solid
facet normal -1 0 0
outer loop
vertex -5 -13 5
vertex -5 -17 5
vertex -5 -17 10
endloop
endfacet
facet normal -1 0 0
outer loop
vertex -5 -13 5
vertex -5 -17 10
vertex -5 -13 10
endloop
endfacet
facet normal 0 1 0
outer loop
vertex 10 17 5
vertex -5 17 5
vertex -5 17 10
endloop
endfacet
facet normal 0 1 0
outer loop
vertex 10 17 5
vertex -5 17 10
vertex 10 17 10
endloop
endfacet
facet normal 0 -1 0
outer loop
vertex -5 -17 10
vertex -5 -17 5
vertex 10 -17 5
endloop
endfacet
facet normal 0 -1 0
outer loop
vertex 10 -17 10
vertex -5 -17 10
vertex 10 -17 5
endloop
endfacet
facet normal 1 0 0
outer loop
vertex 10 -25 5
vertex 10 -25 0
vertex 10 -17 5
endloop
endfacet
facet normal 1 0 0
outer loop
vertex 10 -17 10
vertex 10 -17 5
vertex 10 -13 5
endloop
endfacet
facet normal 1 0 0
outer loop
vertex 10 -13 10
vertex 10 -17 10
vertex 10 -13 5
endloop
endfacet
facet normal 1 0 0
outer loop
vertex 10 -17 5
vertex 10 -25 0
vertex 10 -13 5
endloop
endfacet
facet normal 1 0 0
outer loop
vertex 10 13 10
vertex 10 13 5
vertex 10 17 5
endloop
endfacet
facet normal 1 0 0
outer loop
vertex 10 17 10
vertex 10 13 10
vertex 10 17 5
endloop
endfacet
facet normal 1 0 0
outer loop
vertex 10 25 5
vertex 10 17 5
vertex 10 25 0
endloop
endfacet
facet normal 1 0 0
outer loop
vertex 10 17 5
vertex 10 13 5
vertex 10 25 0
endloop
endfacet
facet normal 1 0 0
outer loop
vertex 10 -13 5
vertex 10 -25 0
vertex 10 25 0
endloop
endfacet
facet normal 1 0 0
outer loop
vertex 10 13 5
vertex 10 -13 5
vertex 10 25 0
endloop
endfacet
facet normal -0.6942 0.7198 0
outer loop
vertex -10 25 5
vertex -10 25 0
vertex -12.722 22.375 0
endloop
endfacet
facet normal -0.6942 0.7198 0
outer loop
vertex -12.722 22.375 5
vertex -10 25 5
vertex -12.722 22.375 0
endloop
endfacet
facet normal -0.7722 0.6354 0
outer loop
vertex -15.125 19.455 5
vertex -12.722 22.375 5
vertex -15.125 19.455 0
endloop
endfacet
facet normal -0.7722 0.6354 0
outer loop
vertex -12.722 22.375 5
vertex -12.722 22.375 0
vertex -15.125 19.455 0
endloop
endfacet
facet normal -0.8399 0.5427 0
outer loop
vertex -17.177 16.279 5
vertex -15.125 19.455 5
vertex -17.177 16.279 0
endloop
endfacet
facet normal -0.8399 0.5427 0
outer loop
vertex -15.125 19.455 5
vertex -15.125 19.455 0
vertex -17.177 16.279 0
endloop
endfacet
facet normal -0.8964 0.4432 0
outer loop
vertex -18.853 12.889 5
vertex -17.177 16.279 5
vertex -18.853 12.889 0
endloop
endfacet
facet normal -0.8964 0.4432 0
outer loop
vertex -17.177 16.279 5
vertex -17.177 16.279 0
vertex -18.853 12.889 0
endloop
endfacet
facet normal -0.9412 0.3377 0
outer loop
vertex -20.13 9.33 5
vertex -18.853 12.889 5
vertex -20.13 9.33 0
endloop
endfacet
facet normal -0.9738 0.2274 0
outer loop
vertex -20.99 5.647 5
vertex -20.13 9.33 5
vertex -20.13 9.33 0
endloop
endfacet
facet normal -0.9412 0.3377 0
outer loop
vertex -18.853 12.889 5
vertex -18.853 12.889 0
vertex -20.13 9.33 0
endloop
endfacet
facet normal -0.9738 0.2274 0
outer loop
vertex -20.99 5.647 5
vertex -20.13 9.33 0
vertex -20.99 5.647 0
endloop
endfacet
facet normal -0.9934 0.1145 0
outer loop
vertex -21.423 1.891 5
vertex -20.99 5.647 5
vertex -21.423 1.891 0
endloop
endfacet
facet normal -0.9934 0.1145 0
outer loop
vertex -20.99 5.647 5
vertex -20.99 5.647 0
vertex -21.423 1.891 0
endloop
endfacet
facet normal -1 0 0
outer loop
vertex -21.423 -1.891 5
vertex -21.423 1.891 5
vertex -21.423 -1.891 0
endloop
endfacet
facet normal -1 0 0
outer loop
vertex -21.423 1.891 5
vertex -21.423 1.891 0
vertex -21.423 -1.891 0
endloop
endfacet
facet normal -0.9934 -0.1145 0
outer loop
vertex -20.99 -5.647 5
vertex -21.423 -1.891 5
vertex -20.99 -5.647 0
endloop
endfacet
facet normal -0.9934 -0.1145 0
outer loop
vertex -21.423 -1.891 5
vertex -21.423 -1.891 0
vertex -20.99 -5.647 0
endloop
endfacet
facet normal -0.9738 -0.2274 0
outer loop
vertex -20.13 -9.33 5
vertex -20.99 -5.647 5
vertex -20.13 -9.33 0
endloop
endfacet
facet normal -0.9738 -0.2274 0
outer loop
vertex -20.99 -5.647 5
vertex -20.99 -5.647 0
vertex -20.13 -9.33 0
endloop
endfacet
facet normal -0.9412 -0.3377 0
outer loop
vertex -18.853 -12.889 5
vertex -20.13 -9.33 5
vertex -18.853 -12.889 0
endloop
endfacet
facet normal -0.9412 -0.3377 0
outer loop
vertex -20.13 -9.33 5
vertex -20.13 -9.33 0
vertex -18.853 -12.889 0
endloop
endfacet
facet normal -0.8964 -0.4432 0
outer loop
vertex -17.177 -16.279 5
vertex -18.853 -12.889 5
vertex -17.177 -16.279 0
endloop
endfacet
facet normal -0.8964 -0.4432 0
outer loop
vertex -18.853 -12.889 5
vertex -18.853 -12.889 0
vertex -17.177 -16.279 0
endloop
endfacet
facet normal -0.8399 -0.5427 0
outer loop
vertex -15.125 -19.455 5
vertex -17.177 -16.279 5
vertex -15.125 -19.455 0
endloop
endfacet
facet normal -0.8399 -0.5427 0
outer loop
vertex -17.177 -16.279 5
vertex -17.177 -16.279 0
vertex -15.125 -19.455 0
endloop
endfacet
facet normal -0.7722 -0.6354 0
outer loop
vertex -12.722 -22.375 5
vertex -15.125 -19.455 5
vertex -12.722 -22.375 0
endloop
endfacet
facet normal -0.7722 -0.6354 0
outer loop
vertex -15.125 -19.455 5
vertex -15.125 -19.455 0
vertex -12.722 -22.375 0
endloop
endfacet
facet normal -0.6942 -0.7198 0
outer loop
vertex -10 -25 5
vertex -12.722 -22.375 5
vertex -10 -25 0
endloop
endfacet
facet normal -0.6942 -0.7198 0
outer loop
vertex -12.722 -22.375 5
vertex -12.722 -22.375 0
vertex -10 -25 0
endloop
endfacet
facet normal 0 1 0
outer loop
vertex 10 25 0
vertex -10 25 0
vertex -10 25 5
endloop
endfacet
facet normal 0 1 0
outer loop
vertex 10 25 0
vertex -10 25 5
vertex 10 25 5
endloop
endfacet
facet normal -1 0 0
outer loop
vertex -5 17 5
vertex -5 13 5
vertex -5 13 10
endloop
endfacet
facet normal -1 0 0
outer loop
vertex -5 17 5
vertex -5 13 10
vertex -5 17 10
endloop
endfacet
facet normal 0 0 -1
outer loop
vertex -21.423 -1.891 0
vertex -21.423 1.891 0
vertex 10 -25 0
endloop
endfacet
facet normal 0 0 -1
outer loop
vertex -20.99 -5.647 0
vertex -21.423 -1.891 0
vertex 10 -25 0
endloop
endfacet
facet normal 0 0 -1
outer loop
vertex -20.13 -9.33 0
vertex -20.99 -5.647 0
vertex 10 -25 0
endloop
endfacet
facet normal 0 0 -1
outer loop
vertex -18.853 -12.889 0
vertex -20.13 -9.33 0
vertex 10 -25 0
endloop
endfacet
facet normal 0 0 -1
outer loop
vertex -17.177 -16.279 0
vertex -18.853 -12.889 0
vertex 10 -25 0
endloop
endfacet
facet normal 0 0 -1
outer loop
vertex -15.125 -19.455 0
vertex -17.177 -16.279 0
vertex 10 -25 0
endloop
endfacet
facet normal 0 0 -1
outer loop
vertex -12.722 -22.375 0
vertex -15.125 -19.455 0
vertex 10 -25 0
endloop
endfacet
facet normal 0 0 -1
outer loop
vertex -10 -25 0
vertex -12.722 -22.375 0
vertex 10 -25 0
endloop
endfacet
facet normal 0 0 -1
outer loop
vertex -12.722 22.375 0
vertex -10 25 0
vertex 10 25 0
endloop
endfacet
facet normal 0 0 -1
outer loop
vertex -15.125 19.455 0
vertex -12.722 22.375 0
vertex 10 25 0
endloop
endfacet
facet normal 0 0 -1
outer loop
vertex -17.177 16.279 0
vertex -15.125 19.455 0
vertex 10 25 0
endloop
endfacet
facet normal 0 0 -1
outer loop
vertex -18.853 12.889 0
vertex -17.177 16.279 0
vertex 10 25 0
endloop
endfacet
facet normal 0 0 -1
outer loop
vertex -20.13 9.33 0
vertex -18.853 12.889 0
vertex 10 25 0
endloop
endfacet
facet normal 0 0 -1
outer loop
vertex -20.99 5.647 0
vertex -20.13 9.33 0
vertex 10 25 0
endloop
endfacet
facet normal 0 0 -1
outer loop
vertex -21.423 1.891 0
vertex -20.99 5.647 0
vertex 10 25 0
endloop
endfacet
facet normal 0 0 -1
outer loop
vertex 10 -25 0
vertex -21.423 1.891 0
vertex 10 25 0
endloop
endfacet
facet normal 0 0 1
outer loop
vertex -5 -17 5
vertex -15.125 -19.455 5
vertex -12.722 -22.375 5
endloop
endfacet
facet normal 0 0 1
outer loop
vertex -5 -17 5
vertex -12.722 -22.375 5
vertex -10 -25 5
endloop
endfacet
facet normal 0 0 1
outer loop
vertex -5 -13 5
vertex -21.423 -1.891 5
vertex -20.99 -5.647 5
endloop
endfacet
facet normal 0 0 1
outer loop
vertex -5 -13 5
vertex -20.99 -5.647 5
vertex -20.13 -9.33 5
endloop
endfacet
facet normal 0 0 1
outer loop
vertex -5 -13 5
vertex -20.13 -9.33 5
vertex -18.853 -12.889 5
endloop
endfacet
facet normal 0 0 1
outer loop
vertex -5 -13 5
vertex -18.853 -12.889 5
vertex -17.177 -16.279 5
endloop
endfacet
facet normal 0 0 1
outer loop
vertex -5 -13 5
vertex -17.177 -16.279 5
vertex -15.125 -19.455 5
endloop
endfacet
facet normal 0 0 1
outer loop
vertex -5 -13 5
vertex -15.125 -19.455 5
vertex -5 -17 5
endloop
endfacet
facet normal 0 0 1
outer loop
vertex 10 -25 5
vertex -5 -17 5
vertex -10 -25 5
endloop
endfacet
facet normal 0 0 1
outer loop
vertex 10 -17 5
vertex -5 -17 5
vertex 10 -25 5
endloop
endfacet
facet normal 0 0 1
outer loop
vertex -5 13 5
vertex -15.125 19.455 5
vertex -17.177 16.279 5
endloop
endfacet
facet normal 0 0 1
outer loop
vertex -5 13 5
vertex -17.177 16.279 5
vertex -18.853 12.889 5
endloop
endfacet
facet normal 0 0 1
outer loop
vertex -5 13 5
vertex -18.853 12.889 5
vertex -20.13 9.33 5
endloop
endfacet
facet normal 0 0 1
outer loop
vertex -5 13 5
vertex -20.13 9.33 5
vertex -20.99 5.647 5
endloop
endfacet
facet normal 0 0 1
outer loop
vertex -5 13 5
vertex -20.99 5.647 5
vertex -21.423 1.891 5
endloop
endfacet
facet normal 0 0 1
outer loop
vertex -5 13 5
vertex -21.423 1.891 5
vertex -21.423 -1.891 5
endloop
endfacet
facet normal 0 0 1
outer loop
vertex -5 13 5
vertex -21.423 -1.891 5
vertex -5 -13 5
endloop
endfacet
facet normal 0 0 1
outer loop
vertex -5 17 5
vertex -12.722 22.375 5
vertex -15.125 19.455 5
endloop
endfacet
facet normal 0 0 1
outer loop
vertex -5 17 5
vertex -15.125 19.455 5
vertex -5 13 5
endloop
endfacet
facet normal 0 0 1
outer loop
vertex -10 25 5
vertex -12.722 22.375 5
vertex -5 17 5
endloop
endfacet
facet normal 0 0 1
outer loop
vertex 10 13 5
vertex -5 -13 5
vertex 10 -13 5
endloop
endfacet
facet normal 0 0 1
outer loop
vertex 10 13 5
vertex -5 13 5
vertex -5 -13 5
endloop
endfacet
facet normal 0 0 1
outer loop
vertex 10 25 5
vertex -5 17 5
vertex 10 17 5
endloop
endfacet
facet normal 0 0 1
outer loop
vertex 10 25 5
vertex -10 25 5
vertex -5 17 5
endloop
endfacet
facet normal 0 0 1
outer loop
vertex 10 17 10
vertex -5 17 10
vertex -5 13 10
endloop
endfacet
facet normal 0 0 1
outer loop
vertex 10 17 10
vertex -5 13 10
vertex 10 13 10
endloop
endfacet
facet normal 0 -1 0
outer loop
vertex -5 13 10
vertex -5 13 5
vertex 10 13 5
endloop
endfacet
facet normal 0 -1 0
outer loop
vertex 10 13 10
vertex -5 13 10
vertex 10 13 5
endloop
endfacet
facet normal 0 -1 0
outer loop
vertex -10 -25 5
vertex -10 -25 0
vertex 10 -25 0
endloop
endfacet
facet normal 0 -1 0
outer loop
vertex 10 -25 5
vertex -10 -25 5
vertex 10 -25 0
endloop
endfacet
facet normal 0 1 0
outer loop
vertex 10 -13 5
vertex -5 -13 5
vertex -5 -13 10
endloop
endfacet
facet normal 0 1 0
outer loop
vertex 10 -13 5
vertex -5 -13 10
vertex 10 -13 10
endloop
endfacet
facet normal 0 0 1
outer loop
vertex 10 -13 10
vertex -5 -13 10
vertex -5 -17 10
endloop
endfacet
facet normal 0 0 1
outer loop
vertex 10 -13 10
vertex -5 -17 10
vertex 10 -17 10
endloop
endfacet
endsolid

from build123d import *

# Parameters (mm, degrees)
F0_W     = 20
F0_H     = 50
F1_DEPTH = 5
F2_W     = 15
F2_H     = 4
F3_DEPTH = 5


with BuildPart() as f1:
    # F0 (on Top) → F1 (new body)
    with BuildSketch(Plane.XY):
        Rectangle(F0_W, F0_H)
        with BuildLine():
            ThreePointArc((-10, 25), (-21.477274, 0), (-10, -25))
            Line((-10, -25), (-10, 25))
        make_face()
    extrude(amount=F1_DEPTH)

    # F2 (on face) → F3 (join)
    with BuildSketch(Plane.XY.offset(5)):
        with Locations((2.5, 15)):
            Rectangle(F2_W, F2_H)
        with Locations((2.5, -15)):
            Rectangle(F2_W, F2_H)
    extrude(amount=F3_DEPTH)


solid = f1.part
